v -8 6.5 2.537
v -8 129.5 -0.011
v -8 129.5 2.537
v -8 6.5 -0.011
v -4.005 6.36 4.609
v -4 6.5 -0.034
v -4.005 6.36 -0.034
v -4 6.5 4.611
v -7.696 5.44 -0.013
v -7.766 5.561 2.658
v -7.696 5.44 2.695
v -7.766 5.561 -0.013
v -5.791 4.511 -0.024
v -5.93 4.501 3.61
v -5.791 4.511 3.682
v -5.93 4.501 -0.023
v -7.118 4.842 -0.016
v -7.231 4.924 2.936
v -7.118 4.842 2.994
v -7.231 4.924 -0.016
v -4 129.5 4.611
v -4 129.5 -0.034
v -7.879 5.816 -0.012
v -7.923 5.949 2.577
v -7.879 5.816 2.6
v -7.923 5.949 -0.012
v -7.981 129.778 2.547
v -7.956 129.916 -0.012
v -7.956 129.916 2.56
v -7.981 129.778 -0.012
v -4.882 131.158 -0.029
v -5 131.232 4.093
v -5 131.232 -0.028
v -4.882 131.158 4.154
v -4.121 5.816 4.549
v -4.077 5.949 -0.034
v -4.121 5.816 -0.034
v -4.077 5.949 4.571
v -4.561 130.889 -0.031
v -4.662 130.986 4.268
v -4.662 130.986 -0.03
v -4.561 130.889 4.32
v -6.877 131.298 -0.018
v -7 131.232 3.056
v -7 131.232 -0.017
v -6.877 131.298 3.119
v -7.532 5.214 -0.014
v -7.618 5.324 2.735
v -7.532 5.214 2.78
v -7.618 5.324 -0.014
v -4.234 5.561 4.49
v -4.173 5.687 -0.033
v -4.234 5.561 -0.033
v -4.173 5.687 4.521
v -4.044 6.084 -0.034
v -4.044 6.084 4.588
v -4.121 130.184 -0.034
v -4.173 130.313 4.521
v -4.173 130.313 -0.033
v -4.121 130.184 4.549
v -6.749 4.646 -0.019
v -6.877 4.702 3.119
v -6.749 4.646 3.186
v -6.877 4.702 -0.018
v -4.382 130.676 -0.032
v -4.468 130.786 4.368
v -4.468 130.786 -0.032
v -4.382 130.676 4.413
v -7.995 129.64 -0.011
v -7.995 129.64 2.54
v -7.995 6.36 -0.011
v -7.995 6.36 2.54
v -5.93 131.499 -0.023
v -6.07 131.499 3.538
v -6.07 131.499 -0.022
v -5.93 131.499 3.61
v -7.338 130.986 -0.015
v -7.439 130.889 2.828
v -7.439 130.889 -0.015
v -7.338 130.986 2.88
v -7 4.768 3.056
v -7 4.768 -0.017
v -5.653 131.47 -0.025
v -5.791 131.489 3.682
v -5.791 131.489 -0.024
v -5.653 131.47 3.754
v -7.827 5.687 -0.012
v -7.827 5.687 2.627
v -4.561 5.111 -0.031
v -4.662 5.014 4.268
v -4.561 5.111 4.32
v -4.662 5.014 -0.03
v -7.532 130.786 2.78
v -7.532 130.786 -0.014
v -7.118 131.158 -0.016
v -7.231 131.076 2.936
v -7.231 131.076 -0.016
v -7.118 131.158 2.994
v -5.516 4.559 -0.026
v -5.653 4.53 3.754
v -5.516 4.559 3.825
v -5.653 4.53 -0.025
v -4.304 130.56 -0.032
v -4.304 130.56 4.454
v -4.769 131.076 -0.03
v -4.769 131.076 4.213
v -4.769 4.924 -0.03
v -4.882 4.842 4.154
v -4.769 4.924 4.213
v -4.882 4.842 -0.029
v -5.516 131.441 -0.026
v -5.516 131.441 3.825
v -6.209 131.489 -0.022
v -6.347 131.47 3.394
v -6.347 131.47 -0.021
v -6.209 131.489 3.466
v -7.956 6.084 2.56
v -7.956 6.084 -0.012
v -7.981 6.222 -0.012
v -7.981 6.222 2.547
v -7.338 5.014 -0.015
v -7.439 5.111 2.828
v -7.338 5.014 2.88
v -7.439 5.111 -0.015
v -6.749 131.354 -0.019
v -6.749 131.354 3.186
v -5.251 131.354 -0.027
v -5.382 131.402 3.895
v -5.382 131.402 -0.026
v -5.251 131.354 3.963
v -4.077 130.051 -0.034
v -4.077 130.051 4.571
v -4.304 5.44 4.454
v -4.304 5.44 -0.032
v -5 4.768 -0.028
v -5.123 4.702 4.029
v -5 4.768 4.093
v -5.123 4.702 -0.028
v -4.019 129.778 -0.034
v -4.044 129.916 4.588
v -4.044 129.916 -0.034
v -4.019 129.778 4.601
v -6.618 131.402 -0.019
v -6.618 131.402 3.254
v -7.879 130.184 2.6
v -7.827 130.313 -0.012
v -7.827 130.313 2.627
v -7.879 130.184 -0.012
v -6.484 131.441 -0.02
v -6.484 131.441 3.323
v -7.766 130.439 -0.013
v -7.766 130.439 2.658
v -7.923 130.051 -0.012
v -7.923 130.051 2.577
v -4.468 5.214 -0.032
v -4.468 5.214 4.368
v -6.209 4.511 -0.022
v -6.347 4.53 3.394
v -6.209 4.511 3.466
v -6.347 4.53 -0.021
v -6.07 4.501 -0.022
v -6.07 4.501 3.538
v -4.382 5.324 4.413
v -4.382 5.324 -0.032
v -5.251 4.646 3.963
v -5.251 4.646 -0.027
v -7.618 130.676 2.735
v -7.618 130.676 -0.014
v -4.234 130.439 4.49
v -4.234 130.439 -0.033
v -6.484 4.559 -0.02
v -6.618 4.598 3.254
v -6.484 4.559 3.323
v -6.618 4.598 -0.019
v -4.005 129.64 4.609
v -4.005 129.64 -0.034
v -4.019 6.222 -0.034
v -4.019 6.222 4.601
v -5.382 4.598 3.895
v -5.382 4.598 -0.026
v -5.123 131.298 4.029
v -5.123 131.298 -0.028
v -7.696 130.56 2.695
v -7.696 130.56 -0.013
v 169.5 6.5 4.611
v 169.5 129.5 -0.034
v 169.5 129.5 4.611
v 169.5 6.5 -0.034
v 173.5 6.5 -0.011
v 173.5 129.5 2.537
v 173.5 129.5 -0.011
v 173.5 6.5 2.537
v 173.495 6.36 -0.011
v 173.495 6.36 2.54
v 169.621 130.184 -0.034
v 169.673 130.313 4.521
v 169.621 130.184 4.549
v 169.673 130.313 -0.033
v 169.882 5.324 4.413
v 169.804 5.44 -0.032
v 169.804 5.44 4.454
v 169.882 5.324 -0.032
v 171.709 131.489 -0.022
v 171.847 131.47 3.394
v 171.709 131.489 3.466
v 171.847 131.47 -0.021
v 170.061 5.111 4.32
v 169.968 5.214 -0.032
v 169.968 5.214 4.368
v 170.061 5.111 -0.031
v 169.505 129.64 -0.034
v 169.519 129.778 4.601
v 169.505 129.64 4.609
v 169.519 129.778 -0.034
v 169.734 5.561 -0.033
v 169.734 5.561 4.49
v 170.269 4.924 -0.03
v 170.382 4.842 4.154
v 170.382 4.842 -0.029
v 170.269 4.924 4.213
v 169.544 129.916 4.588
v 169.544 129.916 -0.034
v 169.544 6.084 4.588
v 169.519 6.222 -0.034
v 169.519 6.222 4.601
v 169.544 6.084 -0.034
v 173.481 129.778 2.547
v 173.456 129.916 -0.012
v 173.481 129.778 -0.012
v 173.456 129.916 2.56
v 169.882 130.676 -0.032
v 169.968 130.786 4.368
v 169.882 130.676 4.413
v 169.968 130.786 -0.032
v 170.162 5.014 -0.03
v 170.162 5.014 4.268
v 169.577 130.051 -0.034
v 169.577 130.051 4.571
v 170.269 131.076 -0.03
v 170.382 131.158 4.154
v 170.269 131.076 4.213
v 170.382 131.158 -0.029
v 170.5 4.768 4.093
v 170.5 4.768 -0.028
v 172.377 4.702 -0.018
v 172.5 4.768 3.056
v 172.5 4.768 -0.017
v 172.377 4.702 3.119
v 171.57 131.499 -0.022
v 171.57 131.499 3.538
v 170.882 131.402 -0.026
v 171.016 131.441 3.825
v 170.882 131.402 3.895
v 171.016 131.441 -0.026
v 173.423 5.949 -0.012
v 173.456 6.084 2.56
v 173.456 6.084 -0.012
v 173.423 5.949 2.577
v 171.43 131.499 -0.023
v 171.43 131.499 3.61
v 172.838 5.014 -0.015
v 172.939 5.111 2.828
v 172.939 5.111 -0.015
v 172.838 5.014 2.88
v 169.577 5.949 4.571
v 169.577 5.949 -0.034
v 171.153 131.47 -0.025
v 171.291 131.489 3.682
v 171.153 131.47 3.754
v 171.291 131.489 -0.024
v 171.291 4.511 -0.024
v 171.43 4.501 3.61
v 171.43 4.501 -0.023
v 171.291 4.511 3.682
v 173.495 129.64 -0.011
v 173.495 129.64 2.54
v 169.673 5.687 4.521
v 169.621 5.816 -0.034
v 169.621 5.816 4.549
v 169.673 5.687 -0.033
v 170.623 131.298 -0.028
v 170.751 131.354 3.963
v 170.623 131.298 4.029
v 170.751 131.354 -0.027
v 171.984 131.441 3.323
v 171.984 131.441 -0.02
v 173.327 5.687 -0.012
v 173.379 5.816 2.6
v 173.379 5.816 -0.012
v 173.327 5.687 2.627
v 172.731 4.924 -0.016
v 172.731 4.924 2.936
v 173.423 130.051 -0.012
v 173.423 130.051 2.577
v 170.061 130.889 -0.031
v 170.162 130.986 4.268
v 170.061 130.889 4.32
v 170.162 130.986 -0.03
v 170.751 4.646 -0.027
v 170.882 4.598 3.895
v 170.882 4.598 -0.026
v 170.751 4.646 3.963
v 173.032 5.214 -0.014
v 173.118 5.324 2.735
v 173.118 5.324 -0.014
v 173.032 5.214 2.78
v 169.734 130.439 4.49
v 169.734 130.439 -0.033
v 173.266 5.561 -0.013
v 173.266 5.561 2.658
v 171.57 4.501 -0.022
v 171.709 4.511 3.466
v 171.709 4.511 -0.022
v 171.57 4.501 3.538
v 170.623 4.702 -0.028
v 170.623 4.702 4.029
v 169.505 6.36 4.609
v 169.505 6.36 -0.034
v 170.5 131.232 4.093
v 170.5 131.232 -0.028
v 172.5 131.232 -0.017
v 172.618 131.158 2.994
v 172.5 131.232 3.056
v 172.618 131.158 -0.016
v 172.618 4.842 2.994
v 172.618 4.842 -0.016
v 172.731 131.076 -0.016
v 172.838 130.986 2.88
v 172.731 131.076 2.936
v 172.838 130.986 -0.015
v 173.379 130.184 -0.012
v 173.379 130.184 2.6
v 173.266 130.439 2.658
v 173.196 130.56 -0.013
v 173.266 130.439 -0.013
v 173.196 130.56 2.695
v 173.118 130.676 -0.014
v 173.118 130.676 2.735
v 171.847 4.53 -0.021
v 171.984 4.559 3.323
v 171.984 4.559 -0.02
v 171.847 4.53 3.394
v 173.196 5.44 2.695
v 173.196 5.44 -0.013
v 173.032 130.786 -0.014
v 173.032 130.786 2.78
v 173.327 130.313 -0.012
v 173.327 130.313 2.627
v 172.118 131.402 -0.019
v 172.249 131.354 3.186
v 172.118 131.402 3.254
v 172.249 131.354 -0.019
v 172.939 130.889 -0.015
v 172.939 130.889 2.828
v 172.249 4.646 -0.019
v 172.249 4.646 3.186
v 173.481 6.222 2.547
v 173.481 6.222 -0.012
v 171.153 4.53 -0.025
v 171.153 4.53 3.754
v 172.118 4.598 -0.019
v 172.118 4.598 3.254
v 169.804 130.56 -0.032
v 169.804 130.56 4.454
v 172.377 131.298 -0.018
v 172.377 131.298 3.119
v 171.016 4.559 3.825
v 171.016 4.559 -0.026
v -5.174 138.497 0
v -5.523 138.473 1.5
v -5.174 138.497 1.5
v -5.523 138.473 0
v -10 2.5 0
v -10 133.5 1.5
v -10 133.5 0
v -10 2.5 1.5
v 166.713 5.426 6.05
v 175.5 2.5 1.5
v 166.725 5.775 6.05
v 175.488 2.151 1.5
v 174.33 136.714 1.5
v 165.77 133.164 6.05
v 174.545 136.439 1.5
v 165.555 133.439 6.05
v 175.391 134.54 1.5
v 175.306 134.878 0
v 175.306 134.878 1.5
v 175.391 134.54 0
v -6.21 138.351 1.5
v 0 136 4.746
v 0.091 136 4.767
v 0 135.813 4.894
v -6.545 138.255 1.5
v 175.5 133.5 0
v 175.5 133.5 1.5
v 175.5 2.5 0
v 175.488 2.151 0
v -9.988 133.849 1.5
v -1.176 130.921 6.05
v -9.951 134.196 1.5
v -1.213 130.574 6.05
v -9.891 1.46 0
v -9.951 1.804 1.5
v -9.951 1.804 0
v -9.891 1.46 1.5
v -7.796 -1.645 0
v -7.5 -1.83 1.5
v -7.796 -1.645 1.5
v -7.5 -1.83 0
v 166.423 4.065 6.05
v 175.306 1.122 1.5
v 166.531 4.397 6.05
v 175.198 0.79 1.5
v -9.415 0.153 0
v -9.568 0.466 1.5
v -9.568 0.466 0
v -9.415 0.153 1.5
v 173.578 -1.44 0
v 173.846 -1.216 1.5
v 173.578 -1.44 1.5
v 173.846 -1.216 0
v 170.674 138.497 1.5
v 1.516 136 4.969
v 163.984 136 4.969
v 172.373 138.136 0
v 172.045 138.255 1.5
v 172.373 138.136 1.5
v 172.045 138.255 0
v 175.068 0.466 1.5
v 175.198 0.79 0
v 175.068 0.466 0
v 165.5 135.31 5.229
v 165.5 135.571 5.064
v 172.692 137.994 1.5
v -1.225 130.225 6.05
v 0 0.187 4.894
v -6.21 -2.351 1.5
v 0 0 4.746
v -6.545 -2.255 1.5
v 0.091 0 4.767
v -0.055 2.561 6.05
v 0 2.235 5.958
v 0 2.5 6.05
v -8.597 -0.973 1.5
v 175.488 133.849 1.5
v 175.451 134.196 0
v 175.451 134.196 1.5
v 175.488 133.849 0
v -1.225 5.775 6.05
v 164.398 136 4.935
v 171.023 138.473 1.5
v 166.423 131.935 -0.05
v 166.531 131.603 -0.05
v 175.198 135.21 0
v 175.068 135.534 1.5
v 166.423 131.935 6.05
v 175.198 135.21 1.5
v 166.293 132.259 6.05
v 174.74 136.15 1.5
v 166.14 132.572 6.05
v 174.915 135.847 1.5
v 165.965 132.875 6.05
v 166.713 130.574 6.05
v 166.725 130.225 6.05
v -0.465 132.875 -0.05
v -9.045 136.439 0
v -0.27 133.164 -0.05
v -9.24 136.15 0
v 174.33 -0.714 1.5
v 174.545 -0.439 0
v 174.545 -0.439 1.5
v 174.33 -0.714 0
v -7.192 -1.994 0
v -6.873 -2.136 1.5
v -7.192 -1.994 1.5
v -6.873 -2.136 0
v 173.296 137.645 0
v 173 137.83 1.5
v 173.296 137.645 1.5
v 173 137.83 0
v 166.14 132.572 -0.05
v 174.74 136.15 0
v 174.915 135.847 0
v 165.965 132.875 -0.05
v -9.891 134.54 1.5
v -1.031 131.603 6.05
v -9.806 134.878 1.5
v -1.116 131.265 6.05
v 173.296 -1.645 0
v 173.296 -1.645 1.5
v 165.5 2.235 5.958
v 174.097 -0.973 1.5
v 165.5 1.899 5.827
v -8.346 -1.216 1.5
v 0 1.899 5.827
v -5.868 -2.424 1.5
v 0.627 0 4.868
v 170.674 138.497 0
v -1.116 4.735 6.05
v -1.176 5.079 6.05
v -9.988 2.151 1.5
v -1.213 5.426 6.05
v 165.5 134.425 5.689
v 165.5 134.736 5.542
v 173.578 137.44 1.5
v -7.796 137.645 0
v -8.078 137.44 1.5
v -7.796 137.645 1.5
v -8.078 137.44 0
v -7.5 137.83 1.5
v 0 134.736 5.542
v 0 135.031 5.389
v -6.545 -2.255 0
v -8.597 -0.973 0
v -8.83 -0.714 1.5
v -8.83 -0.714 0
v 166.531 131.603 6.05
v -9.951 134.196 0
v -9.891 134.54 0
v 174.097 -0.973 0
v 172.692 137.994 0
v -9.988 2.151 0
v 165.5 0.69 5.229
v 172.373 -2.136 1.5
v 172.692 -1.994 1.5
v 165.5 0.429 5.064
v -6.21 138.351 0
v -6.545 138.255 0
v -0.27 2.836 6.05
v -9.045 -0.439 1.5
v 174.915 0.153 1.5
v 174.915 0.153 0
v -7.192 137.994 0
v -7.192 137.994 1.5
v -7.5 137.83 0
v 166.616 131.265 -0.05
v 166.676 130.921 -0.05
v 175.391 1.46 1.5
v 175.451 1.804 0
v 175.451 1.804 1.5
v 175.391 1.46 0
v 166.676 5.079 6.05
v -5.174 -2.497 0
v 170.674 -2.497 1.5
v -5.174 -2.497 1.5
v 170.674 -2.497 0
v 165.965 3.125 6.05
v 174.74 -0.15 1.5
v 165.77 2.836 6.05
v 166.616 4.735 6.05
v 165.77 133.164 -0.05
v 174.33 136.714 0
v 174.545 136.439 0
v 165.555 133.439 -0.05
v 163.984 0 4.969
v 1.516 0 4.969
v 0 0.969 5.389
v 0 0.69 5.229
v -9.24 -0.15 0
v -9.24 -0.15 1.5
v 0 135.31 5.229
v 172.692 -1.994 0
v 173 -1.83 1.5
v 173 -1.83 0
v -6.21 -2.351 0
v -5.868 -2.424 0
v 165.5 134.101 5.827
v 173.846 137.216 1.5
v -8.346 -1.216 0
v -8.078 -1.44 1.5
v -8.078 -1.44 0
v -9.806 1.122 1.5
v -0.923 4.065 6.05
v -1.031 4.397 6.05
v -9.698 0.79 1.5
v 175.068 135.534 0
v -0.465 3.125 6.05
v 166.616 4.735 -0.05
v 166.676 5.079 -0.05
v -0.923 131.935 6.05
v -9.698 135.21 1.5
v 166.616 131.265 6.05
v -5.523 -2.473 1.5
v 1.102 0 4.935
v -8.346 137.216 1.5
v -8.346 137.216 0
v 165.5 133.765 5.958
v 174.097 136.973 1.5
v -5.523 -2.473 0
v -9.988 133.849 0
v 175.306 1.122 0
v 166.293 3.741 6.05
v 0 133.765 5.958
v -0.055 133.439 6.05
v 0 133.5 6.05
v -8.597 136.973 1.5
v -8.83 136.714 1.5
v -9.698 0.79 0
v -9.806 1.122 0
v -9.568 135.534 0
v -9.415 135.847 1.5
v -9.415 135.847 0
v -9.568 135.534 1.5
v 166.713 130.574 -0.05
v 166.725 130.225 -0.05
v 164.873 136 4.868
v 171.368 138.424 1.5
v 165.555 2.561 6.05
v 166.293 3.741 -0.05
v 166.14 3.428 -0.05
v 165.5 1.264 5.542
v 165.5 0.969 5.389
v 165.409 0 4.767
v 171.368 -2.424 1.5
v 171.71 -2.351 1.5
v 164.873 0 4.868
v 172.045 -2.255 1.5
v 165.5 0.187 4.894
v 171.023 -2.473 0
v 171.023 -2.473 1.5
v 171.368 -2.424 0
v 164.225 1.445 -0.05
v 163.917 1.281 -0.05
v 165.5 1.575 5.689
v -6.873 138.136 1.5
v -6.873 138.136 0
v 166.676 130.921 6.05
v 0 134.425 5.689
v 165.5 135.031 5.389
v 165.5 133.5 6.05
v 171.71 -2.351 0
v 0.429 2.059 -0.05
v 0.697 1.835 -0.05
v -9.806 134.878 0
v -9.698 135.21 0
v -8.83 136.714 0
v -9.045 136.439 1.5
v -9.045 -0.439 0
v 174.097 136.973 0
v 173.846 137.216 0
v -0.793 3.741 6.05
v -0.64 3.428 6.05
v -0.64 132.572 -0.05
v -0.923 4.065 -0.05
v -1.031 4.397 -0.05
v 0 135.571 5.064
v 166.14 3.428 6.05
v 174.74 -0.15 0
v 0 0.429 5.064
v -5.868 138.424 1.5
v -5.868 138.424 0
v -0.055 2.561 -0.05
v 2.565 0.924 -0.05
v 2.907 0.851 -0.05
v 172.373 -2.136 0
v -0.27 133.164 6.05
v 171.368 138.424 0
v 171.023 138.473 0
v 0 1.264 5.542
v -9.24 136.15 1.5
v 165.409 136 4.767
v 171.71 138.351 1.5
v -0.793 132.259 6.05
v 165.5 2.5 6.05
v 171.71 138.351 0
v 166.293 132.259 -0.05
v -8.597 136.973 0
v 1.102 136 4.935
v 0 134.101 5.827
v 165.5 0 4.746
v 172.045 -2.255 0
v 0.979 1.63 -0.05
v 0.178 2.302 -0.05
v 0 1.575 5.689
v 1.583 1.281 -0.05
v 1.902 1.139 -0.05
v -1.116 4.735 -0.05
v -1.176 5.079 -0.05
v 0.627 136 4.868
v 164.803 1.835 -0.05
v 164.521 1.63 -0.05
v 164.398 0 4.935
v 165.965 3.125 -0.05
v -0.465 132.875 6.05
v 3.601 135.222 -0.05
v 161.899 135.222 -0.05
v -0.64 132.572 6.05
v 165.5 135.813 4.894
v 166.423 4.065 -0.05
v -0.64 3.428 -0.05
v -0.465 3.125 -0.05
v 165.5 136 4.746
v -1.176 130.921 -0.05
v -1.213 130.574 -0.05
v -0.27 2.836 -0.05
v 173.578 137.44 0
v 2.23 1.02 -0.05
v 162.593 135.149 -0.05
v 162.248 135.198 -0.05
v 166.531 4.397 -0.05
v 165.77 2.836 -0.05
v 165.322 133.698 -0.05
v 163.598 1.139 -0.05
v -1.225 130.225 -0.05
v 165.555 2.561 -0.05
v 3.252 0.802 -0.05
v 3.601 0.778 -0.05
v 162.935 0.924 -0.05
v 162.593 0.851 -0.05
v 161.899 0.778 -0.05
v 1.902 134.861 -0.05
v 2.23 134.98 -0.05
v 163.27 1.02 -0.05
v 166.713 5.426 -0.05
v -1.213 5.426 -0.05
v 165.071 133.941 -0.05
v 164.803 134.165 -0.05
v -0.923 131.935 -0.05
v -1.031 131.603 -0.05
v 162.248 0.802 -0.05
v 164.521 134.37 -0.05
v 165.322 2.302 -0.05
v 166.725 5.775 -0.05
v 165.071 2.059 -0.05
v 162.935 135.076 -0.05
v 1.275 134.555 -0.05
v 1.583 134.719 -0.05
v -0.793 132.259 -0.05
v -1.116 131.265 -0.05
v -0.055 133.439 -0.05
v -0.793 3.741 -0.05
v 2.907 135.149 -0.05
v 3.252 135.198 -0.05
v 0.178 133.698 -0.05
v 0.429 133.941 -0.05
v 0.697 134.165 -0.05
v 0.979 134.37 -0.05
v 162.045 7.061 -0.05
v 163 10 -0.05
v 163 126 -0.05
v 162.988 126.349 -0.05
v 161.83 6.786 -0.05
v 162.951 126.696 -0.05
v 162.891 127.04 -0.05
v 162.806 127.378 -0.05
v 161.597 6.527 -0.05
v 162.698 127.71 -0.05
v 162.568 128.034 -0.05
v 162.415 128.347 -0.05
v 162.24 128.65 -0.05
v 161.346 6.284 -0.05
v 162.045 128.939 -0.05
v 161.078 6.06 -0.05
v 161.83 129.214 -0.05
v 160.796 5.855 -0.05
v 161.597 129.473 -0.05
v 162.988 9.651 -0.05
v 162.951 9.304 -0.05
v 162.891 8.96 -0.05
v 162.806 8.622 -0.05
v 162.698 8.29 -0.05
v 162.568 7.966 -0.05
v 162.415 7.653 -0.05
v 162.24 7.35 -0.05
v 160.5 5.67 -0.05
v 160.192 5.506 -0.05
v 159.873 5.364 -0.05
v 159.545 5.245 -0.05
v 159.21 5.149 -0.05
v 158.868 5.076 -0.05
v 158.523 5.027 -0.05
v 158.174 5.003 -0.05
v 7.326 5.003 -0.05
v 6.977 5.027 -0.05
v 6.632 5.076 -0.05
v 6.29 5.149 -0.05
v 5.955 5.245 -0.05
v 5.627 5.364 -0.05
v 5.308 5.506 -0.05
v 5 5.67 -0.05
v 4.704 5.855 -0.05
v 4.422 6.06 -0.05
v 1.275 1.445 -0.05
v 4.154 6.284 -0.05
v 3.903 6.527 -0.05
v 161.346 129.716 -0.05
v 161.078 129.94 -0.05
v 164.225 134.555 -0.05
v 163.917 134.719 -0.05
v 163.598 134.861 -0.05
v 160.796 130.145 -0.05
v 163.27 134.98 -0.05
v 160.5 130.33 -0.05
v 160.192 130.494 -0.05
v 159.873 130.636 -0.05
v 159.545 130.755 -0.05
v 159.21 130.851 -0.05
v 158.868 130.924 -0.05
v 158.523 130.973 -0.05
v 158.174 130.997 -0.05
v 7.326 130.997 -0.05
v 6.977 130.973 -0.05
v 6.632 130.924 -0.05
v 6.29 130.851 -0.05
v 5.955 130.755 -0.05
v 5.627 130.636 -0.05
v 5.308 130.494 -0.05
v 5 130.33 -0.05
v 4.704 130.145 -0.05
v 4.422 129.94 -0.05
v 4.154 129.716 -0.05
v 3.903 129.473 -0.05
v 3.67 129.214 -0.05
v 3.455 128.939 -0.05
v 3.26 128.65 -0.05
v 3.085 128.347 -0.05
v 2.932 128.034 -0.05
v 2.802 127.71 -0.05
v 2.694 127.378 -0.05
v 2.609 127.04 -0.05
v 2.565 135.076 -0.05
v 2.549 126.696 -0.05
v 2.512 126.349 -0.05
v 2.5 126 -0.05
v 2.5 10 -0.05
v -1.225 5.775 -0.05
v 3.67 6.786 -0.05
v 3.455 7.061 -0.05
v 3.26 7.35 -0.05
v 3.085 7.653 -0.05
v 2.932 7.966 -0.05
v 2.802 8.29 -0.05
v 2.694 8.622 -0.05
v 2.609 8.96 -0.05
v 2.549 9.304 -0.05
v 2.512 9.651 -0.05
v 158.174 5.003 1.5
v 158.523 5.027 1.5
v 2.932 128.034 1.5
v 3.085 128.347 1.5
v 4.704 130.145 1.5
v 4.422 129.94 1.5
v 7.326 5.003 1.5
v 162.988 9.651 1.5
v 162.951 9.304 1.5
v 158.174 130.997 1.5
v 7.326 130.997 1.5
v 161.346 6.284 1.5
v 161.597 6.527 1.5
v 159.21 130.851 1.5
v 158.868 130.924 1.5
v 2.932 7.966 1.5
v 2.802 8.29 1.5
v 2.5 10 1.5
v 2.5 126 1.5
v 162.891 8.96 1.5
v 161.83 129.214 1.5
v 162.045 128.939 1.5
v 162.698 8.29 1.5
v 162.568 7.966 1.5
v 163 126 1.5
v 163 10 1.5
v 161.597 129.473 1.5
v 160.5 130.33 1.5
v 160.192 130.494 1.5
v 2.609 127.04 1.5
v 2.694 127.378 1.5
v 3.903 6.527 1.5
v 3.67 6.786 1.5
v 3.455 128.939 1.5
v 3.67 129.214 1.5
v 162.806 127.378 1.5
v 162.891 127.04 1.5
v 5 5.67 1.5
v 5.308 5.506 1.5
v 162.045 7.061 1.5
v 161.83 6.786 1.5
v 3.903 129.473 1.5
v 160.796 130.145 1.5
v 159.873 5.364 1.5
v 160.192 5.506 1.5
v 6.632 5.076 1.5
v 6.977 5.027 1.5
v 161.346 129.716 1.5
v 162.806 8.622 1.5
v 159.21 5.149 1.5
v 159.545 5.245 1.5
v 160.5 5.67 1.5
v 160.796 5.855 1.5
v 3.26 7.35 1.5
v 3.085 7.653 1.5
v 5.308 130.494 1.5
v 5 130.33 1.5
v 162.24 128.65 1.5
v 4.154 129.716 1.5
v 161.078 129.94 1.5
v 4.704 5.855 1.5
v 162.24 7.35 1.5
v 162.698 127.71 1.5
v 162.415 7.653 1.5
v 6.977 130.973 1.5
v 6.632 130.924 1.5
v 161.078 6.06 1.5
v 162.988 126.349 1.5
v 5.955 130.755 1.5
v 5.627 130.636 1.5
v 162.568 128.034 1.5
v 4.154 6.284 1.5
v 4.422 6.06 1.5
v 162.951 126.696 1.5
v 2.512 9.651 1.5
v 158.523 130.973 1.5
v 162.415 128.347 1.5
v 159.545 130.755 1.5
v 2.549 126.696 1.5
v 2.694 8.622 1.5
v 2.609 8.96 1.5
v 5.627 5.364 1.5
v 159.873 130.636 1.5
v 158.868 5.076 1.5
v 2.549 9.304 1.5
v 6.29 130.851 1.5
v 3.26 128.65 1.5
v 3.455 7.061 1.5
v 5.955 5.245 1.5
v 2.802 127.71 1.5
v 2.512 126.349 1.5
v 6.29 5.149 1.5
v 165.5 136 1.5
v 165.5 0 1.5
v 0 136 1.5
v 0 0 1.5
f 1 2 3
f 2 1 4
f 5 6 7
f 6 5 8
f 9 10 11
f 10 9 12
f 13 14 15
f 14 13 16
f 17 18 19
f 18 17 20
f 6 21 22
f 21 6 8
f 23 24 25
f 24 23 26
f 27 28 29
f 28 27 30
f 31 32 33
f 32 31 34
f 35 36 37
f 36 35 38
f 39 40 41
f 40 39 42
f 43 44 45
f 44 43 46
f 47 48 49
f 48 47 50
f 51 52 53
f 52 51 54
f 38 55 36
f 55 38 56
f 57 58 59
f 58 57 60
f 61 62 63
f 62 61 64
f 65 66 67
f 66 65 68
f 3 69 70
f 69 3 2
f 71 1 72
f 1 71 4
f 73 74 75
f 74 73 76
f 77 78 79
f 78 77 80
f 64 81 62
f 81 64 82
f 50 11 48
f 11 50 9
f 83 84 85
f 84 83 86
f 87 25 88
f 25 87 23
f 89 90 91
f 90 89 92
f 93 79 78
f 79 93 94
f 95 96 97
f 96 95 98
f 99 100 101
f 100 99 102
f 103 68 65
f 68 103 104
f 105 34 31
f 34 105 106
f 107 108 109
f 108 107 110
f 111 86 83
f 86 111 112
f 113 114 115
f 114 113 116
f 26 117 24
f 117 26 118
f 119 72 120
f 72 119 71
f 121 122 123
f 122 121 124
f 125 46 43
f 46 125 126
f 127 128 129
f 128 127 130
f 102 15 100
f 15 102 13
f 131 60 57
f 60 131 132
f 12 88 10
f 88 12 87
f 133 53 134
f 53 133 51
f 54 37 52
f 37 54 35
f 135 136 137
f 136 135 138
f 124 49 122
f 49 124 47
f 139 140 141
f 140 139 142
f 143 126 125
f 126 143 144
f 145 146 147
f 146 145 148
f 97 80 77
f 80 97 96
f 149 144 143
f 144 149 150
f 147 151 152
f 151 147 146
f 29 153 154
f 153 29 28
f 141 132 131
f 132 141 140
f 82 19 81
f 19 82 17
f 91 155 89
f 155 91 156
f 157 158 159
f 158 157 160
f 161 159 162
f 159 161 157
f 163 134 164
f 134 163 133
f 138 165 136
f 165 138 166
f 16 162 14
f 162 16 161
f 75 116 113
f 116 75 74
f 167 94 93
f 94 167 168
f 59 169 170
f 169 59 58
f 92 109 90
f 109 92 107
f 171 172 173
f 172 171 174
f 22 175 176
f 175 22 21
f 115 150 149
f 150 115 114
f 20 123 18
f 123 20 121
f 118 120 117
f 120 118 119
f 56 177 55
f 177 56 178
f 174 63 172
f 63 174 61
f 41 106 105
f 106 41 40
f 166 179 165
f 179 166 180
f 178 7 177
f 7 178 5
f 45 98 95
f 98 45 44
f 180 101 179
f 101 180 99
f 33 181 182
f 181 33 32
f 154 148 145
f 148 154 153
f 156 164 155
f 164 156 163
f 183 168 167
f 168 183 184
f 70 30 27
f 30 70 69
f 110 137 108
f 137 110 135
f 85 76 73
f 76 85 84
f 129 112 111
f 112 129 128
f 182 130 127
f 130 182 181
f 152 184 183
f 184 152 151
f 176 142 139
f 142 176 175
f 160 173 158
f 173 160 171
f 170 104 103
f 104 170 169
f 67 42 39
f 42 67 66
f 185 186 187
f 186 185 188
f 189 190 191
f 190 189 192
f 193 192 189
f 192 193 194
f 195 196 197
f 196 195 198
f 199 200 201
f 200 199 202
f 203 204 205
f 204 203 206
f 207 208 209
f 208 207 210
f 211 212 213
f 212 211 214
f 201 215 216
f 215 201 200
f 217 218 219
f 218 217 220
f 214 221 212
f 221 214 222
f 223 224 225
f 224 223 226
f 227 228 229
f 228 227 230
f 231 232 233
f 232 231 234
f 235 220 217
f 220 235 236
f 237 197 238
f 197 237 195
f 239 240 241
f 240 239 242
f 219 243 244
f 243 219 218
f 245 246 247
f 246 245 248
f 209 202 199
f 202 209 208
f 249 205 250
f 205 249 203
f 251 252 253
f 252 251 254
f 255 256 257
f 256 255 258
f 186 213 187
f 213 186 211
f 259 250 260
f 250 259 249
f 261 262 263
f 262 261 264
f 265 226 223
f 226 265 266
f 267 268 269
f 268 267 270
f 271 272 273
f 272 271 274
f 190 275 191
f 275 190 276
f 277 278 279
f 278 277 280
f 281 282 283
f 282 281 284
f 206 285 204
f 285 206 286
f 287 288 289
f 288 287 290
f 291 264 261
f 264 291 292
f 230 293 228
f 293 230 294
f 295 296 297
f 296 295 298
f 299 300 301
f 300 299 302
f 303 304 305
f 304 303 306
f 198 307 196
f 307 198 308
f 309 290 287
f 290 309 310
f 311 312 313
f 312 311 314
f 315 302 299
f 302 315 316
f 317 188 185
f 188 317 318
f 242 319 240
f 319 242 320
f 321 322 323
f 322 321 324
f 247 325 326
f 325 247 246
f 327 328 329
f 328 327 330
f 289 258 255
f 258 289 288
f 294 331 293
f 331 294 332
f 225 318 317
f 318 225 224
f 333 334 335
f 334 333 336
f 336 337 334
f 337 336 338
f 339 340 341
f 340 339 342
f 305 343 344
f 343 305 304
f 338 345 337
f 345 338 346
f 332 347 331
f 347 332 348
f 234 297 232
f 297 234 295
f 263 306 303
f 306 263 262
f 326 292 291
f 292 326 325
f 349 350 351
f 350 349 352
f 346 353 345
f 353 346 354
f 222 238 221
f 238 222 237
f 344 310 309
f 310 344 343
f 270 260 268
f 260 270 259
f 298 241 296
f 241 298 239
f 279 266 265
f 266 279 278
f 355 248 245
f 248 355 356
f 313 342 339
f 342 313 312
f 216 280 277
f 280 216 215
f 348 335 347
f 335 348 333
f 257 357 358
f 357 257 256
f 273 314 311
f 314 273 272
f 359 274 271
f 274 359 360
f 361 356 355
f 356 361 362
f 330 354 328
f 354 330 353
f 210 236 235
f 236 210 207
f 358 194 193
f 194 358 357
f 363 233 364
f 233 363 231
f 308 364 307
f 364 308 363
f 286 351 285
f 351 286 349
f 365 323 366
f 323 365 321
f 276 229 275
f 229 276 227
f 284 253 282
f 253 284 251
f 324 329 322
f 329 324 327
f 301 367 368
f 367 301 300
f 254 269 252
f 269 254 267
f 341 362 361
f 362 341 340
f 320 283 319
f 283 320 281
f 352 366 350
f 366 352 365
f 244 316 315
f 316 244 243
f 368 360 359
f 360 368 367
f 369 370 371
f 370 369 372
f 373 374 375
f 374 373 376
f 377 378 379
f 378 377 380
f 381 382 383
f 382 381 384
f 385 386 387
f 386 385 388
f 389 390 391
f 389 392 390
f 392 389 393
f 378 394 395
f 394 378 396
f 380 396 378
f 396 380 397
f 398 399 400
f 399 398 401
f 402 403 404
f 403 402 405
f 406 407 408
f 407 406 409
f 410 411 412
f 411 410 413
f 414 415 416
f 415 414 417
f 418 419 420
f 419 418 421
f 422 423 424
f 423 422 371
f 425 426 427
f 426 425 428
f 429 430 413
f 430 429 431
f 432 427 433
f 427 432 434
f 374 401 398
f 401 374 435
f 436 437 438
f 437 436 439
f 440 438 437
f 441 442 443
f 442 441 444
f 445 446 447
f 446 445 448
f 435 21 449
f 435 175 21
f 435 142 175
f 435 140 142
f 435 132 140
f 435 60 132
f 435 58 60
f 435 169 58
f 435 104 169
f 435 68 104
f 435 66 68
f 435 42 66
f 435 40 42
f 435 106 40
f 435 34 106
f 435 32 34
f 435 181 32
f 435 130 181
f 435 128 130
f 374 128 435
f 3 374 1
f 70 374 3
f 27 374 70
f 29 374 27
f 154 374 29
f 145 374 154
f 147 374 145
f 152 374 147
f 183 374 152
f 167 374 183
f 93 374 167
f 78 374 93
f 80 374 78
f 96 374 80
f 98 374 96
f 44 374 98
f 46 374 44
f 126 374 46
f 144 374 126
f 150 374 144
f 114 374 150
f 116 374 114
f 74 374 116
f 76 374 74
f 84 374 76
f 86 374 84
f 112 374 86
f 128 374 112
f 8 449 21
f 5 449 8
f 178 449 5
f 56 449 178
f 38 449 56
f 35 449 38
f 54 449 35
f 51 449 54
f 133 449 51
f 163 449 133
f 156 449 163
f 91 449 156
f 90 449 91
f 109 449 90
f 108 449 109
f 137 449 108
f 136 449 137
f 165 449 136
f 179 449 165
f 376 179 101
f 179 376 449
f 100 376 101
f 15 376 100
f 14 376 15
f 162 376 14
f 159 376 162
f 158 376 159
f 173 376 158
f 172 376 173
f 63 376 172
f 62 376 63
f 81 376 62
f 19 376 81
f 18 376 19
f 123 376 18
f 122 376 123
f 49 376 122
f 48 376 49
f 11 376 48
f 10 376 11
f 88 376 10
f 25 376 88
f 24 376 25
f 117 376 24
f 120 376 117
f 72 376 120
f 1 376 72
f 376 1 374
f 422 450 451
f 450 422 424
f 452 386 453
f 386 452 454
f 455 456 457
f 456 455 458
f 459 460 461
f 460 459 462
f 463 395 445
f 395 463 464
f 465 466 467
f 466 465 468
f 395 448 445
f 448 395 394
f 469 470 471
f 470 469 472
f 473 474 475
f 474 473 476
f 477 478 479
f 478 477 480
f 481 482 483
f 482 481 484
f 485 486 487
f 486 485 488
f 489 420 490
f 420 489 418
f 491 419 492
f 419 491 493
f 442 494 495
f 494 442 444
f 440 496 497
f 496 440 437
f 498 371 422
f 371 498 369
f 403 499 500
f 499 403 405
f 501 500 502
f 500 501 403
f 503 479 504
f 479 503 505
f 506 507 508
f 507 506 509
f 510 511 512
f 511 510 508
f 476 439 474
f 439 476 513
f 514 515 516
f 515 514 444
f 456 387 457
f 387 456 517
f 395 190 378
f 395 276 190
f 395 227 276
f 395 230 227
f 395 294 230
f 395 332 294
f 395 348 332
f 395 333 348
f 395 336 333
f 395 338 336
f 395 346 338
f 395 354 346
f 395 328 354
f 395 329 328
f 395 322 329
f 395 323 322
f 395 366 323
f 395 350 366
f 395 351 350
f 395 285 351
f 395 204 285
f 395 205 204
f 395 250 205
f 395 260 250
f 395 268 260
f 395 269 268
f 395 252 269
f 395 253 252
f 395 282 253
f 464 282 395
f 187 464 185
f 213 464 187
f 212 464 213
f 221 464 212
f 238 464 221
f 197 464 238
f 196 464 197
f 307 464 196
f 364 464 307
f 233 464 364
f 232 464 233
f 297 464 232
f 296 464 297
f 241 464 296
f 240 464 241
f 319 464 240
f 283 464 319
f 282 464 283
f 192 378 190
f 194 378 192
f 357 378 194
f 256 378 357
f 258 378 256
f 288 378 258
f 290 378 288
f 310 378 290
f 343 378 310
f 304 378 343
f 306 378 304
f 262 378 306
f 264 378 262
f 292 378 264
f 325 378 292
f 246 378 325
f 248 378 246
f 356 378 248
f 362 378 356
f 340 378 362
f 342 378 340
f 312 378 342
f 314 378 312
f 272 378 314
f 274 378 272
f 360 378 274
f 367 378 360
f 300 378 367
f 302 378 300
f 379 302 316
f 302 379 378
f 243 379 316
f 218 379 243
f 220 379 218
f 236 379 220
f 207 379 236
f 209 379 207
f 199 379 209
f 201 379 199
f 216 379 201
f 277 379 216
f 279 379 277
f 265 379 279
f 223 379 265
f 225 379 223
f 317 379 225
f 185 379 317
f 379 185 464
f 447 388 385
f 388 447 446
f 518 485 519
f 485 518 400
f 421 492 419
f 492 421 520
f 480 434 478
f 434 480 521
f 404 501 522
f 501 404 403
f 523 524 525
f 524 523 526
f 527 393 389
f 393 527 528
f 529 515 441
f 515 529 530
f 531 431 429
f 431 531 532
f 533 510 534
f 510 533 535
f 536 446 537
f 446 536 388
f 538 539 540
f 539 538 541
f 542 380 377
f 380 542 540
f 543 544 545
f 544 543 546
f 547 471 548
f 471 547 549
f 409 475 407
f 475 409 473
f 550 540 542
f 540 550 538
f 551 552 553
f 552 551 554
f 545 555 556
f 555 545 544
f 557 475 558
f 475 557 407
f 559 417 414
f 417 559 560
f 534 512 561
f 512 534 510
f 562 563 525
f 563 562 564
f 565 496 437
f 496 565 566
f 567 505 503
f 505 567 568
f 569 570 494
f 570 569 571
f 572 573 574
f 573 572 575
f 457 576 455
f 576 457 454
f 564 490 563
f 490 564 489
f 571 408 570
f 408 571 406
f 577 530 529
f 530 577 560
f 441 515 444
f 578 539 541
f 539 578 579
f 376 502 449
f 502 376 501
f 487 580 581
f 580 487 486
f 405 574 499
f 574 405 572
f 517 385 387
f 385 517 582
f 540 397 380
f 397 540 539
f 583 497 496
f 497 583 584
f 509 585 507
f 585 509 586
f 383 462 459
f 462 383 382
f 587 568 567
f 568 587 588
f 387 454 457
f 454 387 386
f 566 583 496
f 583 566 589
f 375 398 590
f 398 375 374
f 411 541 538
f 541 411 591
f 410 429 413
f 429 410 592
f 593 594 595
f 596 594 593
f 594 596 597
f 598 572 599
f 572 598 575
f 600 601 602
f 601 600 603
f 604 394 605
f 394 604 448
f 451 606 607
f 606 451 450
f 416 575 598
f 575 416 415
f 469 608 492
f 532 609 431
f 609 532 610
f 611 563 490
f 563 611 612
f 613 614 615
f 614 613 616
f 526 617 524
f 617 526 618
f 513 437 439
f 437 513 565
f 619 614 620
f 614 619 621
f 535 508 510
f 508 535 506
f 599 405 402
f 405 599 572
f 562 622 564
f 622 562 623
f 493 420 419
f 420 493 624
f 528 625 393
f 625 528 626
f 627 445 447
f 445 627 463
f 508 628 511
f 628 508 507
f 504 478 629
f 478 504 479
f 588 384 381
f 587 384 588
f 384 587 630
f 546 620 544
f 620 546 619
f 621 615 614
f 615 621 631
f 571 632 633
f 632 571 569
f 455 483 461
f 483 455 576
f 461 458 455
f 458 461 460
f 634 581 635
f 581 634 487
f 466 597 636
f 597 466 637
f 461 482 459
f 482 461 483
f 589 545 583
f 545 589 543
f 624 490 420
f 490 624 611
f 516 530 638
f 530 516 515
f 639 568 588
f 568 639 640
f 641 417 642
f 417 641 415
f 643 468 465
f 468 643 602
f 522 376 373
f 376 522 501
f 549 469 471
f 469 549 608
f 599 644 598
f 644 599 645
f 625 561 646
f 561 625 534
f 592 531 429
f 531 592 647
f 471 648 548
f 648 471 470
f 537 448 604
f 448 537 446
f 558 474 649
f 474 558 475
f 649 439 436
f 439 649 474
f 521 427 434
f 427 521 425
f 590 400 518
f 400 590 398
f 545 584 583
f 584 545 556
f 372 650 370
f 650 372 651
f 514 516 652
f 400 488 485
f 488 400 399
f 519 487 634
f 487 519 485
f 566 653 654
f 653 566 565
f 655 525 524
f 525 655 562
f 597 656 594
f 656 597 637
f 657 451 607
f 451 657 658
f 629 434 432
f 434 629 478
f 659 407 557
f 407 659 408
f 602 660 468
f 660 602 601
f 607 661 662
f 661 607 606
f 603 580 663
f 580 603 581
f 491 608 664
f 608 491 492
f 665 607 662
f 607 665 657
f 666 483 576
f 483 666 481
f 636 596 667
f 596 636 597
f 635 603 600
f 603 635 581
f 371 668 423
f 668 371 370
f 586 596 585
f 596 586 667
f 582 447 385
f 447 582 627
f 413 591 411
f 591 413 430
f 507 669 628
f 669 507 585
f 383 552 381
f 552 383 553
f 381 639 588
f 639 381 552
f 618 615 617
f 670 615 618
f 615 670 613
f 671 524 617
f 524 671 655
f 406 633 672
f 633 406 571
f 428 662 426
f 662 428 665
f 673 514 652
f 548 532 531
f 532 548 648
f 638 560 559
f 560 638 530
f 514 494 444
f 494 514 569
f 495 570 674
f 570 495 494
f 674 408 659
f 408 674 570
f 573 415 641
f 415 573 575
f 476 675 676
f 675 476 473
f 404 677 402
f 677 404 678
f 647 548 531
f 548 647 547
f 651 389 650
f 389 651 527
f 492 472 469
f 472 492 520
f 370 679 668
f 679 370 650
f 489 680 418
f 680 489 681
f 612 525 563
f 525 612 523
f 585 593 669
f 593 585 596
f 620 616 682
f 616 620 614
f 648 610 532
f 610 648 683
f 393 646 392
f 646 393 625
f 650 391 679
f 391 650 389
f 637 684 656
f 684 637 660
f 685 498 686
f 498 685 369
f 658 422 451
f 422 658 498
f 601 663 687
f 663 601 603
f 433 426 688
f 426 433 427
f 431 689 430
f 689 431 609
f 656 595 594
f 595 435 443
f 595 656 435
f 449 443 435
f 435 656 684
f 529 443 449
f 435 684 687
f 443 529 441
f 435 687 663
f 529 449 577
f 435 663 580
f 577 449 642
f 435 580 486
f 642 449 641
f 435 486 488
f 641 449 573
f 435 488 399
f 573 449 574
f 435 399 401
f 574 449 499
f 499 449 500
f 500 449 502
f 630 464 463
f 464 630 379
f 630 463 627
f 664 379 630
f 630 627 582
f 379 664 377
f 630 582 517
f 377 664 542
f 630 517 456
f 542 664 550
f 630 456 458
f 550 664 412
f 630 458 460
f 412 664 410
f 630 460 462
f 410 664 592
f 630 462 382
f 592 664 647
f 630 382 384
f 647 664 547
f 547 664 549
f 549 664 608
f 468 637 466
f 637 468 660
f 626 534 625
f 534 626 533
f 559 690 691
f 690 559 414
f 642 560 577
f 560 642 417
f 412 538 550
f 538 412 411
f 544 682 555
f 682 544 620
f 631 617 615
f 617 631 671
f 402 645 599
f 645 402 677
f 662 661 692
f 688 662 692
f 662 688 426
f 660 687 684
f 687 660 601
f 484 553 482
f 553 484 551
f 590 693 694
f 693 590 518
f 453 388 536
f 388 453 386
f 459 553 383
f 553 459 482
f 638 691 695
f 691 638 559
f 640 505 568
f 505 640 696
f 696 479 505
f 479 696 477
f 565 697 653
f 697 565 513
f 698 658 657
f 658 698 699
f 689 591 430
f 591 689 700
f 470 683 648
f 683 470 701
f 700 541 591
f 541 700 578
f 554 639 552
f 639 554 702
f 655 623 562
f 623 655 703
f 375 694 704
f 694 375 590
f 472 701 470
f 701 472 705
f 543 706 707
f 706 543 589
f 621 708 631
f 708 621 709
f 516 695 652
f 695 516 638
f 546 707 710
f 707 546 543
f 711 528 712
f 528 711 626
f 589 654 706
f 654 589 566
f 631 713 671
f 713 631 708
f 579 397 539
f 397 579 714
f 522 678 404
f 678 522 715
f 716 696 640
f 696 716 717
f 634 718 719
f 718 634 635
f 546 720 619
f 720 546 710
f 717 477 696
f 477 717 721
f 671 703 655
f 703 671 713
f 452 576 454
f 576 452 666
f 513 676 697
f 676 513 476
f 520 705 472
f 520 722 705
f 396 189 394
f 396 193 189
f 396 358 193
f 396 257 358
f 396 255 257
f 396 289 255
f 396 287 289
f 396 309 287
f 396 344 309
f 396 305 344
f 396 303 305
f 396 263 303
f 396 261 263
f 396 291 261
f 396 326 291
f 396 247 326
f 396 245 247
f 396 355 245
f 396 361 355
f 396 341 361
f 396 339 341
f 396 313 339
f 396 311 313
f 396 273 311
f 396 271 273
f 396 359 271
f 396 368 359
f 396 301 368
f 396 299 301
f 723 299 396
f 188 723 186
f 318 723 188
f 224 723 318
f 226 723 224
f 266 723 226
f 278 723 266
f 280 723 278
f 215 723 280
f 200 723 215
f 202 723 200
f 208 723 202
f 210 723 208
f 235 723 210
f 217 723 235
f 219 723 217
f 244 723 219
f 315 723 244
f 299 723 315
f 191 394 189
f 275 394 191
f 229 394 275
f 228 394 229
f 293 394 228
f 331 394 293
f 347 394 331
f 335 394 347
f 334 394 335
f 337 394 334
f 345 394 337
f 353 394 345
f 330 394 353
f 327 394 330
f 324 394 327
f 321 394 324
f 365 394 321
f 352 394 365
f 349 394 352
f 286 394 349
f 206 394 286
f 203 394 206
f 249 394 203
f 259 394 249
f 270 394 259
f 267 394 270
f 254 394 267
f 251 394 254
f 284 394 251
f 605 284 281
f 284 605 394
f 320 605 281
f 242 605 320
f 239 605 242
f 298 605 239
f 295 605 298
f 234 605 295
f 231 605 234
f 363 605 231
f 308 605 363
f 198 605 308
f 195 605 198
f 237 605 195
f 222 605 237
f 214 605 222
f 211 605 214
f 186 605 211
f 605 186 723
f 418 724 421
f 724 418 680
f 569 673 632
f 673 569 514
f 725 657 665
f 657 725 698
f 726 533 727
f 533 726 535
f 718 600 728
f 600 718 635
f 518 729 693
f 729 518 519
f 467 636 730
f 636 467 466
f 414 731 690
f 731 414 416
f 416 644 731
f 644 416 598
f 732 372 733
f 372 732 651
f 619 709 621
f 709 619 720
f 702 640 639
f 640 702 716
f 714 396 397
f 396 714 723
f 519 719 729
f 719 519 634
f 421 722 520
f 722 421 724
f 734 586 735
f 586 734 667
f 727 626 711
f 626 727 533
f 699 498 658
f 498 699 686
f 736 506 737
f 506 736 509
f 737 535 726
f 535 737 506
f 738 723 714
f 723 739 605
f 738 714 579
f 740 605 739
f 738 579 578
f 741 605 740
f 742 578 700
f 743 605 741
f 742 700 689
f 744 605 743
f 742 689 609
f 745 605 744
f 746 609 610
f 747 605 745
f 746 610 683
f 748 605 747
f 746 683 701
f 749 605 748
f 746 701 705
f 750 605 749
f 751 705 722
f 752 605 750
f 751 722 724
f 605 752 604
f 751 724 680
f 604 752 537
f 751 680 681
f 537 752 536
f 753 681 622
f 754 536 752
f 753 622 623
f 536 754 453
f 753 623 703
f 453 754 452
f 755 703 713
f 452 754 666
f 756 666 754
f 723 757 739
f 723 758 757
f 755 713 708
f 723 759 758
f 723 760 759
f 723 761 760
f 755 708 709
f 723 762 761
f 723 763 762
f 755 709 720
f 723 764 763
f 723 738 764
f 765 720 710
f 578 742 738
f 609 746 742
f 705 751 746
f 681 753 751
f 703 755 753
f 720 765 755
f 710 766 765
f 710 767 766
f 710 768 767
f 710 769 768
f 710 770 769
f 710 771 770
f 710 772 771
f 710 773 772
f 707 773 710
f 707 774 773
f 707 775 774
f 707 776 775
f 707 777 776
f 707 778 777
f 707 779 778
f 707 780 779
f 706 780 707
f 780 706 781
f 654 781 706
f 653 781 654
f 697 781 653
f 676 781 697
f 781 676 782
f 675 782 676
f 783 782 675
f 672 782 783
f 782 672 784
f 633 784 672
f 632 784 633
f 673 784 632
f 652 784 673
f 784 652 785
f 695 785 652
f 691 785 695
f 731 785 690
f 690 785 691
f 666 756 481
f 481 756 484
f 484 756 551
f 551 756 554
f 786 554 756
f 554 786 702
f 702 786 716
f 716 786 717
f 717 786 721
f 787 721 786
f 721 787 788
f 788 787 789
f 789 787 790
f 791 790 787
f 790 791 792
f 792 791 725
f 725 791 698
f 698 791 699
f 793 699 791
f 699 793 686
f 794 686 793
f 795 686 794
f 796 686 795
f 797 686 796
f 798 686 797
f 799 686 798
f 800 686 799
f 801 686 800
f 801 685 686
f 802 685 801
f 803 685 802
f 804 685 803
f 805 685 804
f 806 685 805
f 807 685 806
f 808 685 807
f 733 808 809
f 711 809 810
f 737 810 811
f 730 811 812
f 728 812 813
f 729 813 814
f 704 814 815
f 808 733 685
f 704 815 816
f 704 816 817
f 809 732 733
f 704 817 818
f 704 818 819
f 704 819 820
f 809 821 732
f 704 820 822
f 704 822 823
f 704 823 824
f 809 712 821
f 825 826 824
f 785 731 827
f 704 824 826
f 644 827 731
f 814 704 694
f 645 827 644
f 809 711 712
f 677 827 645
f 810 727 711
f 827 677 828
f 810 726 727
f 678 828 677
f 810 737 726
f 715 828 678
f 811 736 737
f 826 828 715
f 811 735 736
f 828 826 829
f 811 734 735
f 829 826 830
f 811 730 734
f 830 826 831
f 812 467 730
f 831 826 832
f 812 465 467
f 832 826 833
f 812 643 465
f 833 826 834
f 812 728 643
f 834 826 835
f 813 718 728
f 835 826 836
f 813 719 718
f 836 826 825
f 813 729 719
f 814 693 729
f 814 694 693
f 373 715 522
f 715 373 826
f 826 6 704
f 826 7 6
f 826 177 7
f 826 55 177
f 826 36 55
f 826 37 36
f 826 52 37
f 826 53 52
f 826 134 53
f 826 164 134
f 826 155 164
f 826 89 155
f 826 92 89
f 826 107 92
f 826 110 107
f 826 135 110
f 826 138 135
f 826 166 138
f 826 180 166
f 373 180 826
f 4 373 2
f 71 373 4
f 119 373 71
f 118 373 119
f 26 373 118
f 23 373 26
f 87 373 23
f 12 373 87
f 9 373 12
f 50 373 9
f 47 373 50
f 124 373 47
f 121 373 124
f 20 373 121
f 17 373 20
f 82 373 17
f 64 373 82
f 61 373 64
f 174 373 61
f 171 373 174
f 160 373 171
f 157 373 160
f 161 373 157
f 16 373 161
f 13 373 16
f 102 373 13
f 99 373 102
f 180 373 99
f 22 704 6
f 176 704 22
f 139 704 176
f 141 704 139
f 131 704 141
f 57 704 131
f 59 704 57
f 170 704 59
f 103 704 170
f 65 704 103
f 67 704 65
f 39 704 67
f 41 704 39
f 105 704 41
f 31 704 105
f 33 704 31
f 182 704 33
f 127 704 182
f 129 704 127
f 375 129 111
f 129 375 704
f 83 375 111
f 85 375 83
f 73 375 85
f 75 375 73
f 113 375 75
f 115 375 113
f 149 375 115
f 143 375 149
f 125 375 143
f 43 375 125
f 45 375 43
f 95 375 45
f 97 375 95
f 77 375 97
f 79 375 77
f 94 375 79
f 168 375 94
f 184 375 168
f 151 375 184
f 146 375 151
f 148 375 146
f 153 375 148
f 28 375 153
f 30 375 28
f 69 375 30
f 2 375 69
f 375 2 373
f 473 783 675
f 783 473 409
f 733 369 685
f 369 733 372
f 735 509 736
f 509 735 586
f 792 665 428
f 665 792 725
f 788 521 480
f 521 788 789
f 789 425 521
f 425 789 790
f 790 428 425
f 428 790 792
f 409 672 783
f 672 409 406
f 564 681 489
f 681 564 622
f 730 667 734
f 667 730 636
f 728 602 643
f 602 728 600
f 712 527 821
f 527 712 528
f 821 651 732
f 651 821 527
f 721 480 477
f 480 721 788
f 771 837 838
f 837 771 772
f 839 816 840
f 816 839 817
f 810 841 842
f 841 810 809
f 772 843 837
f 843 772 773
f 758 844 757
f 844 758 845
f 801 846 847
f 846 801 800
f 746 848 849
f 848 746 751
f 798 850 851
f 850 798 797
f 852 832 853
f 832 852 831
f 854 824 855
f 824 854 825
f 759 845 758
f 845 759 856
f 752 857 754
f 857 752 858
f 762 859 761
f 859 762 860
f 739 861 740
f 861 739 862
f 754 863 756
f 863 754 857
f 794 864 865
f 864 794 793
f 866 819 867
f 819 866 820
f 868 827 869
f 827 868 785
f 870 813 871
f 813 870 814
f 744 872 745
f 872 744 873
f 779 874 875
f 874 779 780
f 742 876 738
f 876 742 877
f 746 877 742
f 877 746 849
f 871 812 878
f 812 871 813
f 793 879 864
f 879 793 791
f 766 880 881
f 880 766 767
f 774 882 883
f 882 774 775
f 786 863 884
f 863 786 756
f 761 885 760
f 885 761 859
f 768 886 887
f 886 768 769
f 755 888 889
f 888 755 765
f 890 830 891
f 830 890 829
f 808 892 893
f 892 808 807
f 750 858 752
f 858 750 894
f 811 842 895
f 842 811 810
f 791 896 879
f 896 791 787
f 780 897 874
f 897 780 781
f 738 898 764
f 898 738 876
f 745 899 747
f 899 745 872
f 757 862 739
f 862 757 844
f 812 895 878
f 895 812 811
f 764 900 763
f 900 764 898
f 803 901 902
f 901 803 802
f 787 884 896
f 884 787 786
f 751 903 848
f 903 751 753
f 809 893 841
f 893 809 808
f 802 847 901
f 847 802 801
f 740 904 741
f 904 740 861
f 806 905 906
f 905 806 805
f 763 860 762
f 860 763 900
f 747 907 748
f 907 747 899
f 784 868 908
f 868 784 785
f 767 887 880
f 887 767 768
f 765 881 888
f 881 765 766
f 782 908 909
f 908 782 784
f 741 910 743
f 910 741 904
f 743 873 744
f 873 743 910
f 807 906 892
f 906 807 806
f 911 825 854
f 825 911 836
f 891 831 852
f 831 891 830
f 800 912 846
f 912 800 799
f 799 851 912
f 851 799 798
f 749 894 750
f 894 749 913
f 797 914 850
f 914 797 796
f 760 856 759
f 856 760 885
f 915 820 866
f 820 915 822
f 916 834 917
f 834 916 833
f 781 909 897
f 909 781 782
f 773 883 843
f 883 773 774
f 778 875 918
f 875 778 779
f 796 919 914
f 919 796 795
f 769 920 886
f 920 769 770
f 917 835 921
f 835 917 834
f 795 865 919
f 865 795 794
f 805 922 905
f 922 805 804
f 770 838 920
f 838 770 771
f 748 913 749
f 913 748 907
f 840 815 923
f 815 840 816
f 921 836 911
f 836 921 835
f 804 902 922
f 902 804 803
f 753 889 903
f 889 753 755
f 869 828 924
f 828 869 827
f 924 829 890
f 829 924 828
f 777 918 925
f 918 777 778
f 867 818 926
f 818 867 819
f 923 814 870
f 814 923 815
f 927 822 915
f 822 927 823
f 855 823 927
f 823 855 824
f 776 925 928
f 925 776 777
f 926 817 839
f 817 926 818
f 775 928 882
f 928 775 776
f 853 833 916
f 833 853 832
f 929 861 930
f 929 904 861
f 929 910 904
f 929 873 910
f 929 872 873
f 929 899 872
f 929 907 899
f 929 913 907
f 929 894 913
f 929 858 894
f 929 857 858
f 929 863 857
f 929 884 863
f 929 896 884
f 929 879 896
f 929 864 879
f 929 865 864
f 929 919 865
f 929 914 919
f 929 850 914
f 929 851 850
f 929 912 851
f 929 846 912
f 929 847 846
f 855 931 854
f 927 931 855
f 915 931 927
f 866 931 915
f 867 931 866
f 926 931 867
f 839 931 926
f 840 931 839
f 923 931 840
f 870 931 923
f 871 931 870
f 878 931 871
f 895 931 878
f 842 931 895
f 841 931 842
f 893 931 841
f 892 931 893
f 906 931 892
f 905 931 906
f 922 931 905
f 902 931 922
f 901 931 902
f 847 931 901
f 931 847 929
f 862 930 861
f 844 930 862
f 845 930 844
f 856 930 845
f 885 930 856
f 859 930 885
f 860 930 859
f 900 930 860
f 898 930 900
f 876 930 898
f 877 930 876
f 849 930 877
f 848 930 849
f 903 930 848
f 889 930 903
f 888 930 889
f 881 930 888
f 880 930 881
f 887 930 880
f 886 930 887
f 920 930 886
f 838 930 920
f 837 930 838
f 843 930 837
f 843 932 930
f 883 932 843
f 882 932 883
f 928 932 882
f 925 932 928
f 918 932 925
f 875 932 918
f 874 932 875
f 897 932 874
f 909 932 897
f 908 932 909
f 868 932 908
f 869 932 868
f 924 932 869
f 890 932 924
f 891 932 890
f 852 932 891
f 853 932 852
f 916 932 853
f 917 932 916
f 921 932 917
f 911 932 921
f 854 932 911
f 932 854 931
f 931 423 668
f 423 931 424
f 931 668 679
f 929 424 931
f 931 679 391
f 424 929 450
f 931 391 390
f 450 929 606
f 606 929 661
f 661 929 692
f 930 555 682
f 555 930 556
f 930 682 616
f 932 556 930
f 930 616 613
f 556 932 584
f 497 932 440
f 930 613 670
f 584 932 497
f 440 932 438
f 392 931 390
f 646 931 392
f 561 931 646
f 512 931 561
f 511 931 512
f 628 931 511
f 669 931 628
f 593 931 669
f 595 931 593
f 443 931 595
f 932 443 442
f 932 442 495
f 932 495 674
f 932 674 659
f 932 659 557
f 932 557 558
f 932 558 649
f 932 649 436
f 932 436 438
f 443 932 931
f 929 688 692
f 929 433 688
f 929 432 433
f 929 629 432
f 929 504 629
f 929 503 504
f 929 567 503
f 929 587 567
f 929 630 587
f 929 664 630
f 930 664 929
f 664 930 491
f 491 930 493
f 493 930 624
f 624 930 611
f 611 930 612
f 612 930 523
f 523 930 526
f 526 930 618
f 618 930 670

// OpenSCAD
// Dimensions of the panel. The X dimension will have the fabric straps. I prefer to have them on the larger axis (making them narrower). 
solar_X = 165.5;
solar_Y = 136;

// How wide of a gap to use for the fabric or straps. 
fabric_gap = 4;

// Thickness of the base 
bracket_base_depth = 1.5;

/* [Hidden] */ 

// My panels taper and the outer most edge is slightly smaller. These 
// parameters create a negative model of the panel that is subtracted out.
// You can probably leave these alone. 
solar_Z_max = 3;
// Can probably leave alone
solar_Z_min = 2.3;
// Can probably leave alone
solar_slope_offset = 3;

// Sets how much material is cut out underneath 
bracket_cutout_offset = 15;

// Can probably leave alone
wall_overhang = 10;
// Can probably leave alone
wall_depth = 2;
// Can probably leave alone
side_overhang = 2.5;
// Can probably leave alone
fudge = 0.1;
$fn = 90;

module _bracket_base(bx, by, bz, mink) {
    if(bx < 0 || by < 0 || bz < 0) {
        echo("Solar panel is too small for the specified parameters - try reducing wall overhang");
    }

    echo(bx,by,bz,mink);
        minkowski() {
            cylinder(d=mink, h=bz);
            cube([bx, by, bz]);
        }
}

module _fab_gap(bx, by, bz) {
    hull() {
        translate([-1, fabric_gap, -fudge])
            cylinder(d=fabric_gap, h = solar_Z_max*2 + bracket_base_depth);
        translate([-1, by - fabric_gap, -fudge])
            cylinder(d=fabric_gap, h = solar_Z_max*2 + bracket_base_depth);
    }
}

module fab_gap(bx, by, bz) {
    _fab_gap(bx, by, bz);
    translate([bx + 2, 0])
        _fab_gap(bx, by, bz);
}

module bracket_base() {
    mink = wall_overhang;
    bz = bracket_base_depth/2; // Note, Minkowsky will add to the height, too

    bx = solar_X + mink;
    by = solar_Y - mink + side_overhang*2;

    translate([-(bx - solar_X)/2, -(by - solar_Y)/2]) 
        difference() {
            hull() {
                _bracket_base(bx, by, bz, mink);
                bxx = bx * 0.9;
                byy = by * 0.95;
                bzz = bz + solar_Z_min;
                translate([(bx - bxx)/2, (by - byy)/2, -fudge/2]) 
                    _bracket_base(bxx, byy, bzz, mink);
            }

            bxx = bx - bracket_cutout_offset - wall_overhang;
            byy = by - bracket_cutout_offset;
            translate([(bx - bxx)/2, (by - byy)/2, -fudge]) 
                scale([1,1,1.5])
                    _bracket_base(bxx, byy, bz, mink);

            fab_gap(bx, by, bz);

            //translate([bx/2, -solar_Y/2, bz/2 + 101])
            //    rotate([-90, 0])
            //        cylinder(d = 200, h = solar_Y*2);
        }
}

module panel() {
    hull() {
        cube([solar_X, solar_Y, solar_Z_min]);
        translate([solar_slope_offset, solar_slope_offset])
            cube([solar_X - solar_slope_offset, solar_Y - solar_slope_offset*2, solar_Z_max]);
    }

    // This cube isn't technically panel. Having it keeps the space over the panel clear
    cube([solar_X, solar_Y, solar_Z_max*2 + bracket_base_depth]);
}

module taper() {
    translate([-wall_overhang/2, -solar_Y/2, bracket_base_depth])
        rotate([0, -30, 0])
            cube([solar_X, solar_Y * 2, solar_Z_max]); // abritrarily heigh and deep

    translate([solar_X + wall_overhang/2, -solar_Y/2, bracket_base_depth])
        rotate([0, 30])
            translate([-solar_X,0])
                cube([solar_X, solar_Y * 2, solar_Z_max]); // abritrarily heigh and deep
}

module main() {

    difference() {
        bracket_base();
        translate([0, 0, bracket_base_depth])
            panel();
        // taper();
    }
}

main();
